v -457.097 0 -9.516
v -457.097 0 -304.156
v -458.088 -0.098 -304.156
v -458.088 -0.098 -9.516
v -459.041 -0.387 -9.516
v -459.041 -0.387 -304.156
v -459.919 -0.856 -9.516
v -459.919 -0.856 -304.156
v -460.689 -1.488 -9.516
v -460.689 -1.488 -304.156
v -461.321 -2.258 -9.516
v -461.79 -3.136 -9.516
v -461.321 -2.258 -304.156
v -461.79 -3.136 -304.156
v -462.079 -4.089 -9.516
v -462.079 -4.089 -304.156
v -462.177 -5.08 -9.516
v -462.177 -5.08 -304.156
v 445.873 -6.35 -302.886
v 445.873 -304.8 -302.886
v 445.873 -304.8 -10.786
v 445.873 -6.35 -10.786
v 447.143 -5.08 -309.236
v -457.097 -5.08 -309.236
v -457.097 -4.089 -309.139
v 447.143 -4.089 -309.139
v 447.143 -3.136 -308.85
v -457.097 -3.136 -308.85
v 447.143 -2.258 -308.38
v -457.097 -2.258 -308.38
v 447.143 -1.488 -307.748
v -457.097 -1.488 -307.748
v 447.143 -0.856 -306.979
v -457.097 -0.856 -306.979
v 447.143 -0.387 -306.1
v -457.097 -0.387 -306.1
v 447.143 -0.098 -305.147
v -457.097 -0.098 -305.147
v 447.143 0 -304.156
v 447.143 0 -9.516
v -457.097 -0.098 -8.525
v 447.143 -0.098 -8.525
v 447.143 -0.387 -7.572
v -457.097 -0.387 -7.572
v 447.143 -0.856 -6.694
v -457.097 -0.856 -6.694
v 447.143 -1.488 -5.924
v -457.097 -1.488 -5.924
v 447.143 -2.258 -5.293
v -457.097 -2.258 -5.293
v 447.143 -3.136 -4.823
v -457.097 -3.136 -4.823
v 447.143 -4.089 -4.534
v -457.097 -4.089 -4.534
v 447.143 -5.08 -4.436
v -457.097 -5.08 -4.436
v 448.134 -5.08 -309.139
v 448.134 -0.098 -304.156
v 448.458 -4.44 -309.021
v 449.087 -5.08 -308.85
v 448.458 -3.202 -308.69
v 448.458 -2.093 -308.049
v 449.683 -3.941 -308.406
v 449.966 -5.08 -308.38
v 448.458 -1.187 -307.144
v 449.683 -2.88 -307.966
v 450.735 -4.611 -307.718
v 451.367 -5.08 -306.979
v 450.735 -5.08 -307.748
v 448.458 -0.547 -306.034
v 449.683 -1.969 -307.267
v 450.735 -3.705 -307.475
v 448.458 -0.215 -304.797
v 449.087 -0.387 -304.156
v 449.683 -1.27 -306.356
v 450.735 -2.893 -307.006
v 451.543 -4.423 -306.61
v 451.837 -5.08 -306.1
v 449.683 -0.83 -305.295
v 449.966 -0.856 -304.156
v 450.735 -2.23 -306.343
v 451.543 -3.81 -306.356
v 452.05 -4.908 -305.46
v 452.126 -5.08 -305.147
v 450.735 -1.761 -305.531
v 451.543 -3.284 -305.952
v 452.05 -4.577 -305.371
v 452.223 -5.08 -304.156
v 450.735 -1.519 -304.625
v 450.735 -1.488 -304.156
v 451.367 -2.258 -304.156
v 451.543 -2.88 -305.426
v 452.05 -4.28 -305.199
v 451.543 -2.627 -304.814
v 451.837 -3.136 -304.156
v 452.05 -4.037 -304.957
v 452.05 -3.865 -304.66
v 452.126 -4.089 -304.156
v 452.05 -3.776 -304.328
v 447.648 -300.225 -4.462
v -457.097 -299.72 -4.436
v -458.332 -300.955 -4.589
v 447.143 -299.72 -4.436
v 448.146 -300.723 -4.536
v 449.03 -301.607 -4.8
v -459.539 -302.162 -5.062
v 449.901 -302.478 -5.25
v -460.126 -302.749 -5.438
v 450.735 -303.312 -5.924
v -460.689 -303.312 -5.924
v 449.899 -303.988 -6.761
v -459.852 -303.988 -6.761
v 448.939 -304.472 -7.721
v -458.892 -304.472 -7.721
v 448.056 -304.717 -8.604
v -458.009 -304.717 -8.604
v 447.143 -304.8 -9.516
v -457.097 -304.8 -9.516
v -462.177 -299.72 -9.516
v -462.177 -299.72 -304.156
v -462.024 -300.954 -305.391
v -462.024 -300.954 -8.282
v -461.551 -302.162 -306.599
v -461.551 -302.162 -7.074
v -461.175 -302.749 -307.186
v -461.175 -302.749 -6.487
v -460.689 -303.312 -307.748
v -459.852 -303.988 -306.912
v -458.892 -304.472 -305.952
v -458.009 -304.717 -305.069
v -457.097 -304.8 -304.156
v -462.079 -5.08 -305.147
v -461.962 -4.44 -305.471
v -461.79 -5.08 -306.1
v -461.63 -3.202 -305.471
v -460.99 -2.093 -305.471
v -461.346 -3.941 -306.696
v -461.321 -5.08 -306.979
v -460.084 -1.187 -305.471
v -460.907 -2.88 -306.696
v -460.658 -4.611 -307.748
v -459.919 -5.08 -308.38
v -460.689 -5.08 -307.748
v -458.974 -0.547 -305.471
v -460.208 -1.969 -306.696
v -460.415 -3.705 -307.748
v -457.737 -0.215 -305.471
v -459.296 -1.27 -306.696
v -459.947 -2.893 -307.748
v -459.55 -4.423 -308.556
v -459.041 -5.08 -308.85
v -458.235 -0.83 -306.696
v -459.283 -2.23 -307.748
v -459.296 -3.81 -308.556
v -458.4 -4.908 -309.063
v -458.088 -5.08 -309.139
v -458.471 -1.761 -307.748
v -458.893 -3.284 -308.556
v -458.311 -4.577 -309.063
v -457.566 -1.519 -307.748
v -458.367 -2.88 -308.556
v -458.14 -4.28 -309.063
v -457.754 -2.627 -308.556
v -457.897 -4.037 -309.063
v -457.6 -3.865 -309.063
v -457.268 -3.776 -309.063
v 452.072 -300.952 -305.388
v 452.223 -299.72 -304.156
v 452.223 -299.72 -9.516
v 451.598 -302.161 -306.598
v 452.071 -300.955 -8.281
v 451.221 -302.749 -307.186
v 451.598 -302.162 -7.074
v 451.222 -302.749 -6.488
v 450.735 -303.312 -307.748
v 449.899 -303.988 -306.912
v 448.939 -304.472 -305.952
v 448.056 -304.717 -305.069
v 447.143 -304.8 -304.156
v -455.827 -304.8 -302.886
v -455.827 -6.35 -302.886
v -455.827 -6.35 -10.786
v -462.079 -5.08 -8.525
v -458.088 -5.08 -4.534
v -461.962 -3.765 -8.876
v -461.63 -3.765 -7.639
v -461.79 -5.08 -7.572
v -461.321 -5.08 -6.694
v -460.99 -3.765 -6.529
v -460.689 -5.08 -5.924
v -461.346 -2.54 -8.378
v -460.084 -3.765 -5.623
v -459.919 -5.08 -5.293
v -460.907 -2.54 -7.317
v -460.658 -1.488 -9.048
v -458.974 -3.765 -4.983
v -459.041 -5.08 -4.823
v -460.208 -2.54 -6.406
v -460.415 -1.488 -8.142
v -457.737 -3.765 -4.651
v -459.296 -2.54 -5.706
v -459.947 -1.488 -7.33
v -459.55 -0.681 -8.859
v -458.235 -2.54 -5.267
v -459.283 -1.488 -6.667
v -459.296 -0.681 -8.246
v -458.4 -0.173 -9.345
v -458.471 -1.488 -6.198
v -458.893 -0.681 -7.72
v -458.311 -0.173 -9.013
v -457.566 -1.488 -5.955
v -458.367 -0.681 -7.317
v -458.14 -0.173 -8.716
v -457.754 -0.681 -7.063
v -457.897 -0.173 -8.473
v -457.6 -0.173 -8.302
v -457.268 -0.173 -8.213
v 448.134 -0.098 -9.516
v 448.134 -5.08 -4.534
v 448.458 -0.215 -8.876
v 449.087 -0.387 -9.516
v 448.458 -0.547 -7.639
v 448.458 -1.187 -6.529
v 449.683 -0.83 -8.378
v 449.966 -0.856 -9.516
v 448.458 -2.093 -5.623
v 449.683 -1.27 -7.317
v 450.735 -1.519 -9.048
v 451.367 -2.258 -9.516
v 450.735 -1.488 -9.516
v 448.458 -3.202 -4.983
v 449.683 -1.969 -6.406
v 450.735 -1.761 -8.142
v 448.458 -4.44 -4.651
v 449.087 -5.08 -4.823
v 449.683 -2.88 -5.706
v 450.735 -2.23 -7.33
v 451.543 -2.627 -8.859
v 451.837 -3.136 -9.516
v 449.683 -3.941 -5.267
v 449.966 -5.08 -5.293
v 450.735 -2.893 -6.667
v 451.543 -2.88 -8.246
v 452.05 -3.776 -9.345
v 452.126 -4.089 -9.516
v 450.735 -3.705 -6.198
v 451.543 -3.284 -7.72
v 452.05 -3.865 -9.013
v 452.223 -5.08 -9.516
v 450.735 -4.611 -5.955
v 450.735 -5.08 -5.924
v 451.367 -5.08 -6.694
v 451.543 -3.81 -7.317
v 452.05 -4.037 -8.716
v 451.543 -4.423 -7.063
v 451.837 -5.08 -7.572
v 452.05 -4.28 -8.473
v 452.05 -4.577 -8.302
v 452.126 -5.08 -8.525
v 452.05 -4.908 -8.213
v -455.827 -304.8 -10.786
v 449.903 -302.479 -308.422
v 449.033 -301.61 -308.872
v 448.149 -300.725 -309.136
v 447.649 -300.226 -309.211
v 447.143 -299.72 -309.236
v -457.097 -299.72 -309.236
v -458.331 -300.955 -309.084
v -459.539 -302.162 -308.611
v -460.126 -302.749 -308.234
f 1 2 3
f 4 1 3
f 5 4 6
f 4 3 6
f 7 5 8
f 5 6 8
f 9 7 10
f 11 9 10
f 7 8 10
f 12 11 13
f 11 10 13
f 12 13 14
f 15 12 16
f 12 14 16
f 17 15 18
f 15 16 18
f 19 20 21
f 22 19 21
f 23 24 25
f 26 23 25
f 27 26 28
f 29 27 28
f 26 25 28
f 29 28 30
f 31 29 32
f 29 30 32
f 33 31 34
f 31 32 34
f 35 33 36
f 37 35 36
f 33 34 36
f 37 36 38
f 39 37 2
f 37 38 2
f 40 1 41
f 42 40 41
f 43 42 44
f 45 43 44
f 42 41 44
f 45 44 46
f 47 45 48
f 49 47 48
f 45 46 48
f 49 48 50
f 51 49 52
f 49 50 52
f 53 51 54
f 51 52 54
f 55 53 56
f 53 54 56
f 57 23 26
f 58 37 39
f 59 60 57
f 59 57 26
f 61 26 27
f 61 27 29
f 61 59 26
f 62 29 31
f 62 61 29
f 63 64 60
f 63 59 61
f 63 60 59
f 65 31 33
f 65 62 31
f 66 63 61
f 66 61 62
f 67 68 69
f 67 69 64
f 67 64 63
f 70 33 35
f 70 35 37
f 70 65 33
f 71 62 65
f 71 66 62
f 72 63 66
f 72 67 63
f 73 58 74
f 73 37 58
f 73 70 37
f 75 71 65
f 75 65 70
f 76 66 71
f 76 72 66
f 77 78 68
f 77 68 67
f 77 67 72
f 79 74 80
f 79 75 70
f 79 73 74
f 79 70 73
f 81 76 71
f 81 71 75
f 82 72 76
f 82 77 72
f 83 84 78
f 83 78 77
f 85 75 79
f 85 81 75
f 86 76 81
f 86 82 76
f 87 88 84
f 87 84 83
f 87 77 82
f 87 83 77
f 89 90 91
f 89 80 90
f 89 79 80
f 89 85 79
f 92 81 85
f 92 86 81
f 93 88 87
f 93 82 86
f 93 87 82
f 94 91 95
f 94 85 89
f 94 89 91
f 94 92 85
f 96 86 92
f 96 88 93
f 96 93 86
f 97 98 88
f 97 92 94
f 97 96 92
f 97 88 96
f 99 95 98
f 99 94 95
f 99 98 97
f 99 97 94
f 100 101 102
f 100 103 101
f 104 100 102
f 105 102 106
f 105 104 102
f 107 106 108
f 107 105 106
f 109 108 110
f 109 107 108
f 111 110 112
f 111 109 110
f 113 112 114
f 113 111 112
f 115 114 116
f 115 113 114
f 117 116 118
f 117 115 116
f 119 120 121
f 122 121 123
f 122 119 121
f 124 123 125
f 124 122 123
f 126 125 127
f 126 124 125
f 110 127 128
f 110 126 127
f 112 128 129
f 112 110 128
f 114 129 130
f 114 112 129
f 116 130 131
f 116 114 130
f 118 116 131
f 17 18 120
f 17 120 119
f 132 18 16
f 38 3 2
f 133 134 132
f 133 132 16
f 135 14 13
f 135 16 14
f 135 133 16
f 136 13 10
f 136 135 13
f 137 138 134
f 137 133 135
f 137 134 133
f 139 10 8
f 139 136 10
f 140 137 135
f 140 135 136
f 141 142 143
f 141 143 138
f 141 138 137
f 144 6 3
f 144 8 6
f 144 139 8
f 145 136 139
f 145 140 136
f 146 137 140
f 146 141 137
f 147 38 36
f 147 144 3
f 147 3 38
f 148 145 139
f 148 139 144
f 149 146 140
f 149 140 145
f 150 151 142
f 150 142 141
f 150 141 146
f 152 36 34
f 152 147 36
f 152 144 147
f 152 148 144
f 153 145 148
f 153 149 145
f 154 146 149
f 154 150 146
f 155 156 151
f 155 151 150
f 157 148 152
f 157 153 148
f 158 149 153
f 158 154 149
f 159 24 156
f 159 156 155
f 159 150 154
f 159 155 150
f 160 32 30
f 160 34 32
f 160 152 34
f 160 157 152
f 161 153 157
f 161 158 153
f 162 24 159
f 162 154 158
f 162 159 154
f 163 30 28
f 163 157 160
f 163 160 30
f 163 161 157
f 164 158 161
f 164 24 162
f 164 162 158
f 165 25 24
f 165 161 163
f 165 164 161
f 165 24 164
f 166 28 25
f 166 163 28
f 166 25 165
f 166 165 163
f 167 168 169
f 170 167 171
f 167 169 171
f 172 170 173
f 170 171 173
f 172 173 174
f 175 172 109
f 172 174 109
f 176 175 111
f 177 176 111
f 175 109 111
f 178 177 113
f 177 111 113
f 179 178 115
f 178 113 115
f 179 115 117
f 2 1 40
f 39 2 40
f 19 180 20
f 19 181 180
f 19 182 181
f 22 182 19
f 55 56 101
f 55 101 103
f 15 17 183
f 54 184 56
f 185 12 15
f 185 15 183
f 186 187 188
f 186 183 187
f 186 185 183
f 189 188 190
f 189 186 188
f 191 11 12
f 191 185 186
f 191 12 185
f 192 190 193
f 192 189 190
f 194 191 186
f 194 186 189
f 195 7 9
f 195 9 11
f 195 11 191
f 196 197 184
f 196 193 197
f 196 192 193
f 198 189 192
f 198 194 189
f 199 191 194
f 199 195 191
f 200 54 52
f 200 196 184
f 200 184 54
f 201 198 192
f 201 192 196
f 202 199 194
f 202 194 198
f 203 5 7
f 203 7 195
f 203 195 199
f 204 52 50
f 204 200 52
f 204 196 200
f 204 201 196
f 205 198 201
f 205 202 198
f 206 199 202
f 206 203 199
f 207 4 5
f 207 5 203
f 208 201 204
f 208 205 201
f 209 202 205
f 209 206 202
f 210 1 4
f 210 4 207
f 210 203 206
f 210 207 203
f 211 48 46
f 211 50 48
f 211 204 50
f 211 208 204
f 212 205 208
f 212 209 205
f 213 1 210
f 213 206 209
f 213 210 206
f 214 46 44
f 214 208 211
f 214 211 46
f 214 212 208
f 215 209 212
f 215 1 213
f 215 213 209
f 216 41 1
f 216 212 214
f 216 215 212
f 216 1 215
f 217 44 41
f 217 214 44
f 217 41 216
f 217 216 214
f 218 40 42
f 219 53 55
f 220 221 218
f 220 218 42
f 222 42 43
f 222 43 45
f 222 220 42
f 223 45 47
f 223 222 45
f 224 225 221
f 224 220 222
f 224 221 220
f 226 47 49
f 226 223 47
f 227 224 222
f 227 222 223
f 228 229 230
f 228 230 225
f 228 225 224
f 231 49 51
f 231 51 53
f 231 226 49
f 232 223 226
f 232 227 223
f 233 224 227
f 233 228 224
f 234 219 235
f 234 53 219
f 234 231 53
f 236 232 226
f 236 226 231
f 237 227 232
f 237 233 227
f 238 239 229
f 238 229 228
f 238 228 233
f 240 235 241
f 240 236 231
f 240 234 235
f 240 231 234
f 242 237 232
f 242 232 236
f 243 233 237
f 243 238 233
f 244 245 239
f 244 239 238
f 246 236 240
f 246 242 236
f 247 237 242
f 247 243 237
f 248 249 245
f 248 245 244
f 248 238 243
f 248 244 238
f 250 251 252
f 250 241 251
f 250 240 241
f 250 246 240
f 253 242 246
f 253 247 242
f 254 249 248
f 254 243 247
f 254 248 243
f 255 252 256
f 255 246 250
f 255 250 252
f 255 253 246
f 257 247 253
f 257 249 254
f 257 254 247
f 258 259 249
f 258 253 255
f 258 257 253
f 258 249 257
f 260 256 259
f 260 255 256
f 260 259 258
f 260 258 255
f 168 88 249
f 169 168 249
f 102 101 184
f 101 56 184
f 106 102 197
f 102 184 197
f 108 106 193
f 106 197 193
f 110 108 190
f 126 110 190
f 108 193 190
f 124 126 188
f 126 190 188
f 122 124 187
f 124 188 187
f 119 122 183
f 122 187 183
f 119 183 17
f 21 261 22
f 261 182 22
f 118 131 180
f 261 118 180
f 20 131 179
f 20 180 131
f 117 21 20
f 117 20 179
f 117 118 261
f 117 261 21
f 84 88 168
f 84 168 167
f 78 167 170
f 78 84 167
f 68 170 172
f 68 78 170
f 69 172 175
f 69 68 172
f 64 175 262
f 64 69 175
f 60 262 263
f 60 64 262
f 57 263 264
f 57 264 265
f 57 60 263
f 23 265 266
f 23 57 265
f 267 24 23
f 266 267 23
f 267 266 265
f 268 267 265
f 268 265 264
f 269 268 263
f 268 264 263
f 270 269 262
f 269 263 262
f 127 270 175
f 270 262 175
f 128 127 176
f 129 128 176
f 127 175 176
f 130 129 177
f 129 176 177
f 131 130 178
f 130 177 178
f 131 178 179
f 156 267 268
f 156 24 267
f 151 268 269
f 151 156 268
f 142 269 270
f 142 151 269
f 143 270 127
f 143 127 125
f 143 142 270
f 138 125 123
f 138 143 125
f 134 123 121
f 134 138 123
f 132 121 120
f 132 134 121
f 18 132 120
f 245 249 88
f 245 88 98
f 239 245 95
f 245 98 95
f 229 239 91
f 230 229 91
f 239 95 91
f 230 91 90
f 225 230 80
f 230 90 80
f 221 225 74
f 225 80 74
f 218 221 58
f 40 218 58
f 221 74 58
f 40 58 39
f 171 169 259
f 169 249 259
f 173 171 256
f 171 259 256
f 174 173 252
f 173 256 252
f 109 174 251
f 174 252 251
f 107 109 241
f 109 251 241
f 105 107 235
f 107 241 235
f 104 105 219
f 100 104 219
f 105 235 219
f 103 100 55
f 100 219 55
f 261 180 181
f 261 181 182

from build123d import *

# Parameters (mm, degrees)
F0_W         = 914.4
F0_H         = 304.8
F1_DEPTH     = 304.8
F2_T         = -6.35
F3_R         = 5.08
F4_T1_DEPTH  = 307.34
F4_T3_DEPTH  = 904.24
F4_T5_DEPTH  = 294.64
F4_S9_W      = 5.1816
F4_S9_H      = 5.1816
F4_T10_DEPTH = 5.1816
F4_S15_W     = 5.1816
F4_S15_H     = 5.1816
F4_T16_DEPTH = 5.1816
F4_S21_W     = 5.1816
F4_S21_H     = 5.1816
F4_T22_DEPTH = 5.1816
F4_S27_W     = 5.1816
F4_S27_H     = 5.1816
F4_T28_DEPTH = 5.1816


# Not quite as in the source:
# - a fillet or chamfer that OpenCascade refuses, or shapes differently, is made with other operations: its cross-section is extruded or revolved along the edge and cut away or added


with BuildPart() as f1:
    # F0 (on Front) → F1 (new body)
    with BuildSketch(Plane.XZ):
        with Locations((-4.9767009914, -156.8363738472)):
            Rectangle(F0_W, F0_H)
    extrude(amount=F1_DEPTH)

    # F2
    f2_openings = [f1.faces().sort_by_distance(p)[0] for p in [
        (-4.976701, -304.8, -156.836374),
    ]]
    offset(amount=F2_T, openings=f2_openings)

    # F3
    f3_edges = [f1.edges().sort_by_distance(p)[0] for p in [
        (-4.976701, -304.8, -4.436374),
        (-462.176701, -304.8, -156.836374),
        (-4.976701, -304.8, -309.236374),
        (452.223299, -304.8, -156.836374),
    ]]
    fillet(f3_edges, radius=F3_R)

    # F4: fillet of radius 5.08 on 12 edges, made by hand

    # F4_s2 → F4_t1 (cut)
    with BuildSketch(Plane.XZ.offset(5.08)):
        with BuildLine():
            ThreePointArc((452.2232990086, -9.5163738472), (450.735401457, -5.9242713988), (447.1432990086, -4.4363738472))
            Line((447.1432990086, -4.4363738472), (452.2232990086, -4.4363738472))
            Line((452.2232990086, -4.4363738472), (452.2232990086, -9.5163738472))
        make_face()
        with BuildLine():
            ThreePointArc((-457.0967009914, -4.4363738472), (-460.6888034398, -5.9242713988), (-462.1767009914, -9.5163738472))
            Line((-462.1767009914, -9.5163738472), (-462.1767009914, -4.4363738472))
            Line((-462.1767009914, -4.4363738472), (-457.0967009914, -4.4363738472))
        make_face()
        with BuildLine():
            ThreePointArc((-457.0967009914, -309.2363738472), (-460.6888034398, -307.7484762956), (-462.1767009914, -304.1563738472))
            Line((-462.1767009914, -304.1563738472), (-462.1767009914, -309.2363738472))
            Line((-462.1767009914, -309.2363738472), (-457.0967009914, -309.2363738472))
        make_face()
        with BuildLine():
            ThreePointArc((452.2232990086, -304.1563738472), (450.735401457, -307.7484762956), (447.1432990086, -309.2363738472))
            Line((447.1432990086, -309.2363738472), (452.2232990086, -309.2363738472))
            Line((452.2232990086, -309.2363738472), (452.2232990086, -304.1563738472))
        make_face()
    extrude(amount=F4_T1_DEPTH, mode=Mode.SUBTRACT)

    # F4_s4 → F4_t3 (cut)
    with BuildSketch(Plane.YZ.offset(-457.0967009914)):
        with BuildLine():
            ThreePointArc((0, -9.5163738472), (-1.4878975516, -5.9242713988), (-5.08, -4.4363738472))
            Line((-5.08, -4.4363738472), (0, -4.4363738472))
            Line((0, -4.4363738472), (0, -9.5163738472))
        make_face()
        with BuildLine():
            ThreePointArc((-5.08, -309.2363738472), (-1.4878975516, -307.7484762956), (0, -304.1563738472))
            Line((0, -304.1563738472), (0, -309.2363738472))
            Line((0, -309.2363738472), (-5.08, -309.2363738472))
        make_face()
    extrude(amount=F4_T3_DEPTH, mode=Mode.SUBTRACT)

    # F4_s6 → F4_t5 (cut)
    with BuildSketch(Plane.XY.offset(-304.1563738472)):
        with BuildLine():
            ThreePointArc((-457.0967009914, 0), (-460.6888034398, -1.4878975516), (-462.1767009914, -5.08))
            Line((-462.1767009914, -5.08), (-462.1767009914, 0))
            Line((-462.1767009914, 0), (-457.0967009914, 0))
        make_face()
        with BuildLine():
            ThreePointArc((452.2232990086, -5.08), (450.735401457, -1.4878975516), (447.1432990086, 0))
            Line((447.1432990086, 0), (452.2232990086, 0))
            Line((452.2232990086, 0), (452.2232990086, -5.08))
        make_face()
    extrude(amount=F4_T5_DEPTH, mode=Mode.SUBTRACT)


with BuildPart() as f4_tool8:
    # F4_s9 → F4_t10 (new body)
    with BuildSketch(Plane.YZ.offset(447.1432990086)):
        with Locations((-2.4892, -6.9255738472)):
            Rectangle(F4_S9_W, F4_S9_H)
    extrude(amount=F4_T10_DEPTH)

    # F4_s11 → F4_t12 (revolve, cut)
    with BuildSketch(Plane(origin=(447.1432990086, -5.08, -9.5163738472), x_dir=(0, -0.7071067812, -0.7071067812), z_dir=(0, -0.7071067812, 0.7071067812))):
        with BuildLine():
            ThreePointArc((0, -5.08), (5.08, 0), (0, 5.08))
            Line((0, 5.08), (0, -5.08))
        make_face()
    revolve(axis=Axis((447.1432990086, -5.08, -9.5163738472), (1, 0, 0)), mode=Mode.SUBTRACT)


with BuildPart() as f1_1:
    add(f1.part)

    # F4_t7: cut F4_tool8
    add(f4_tool8.part, mode=Mode.SUBTRACT)


with BuildPart() as f4_tool14:
    # F4_s15 → F4_t16 (new body)
    with BuildSketch(Plane.XZ.offset(5.08)):
        with Locations((-459.6875009914, -6.9255738472)):
            Rectangle(F4_S15_W, F4_S15_H)
    extrude(amount=-F4_T16_DEPTH)

    # F4_s17 → F4_t18 (revolve, cut)
    with BuildSketch(Plane(origin=(-457.0967009914, -5.08, -9.5163738472), x_dir=(0.7071067812, 0, -0.7071067812), z_dir=(0.7071067812, 0, 0.7071067812))):
        with BuildLine():
            ThreePointArc((0, -5.08), (5.08, 0), (0, 5.08))
            Line((0, 5.08), (0, -5.08))
        make_face()
    revolve(axis=Axis((-457.0967009914, -5.08, -9.5163738472), (0, 1, 0)), mode=Mode.SUBTRACT)


with BuildPart() as f1_2:
    add(f1_1.part)

    # F4_t13: cut F4_tool14
    add(f4_tool14.part, mode=Mode.SUBTRACT)


with BuildPart() as f4_tool20:
    # F4_s21 → F4_t22 (new body)
    with BuildSketch(Plane.XY.offset(-304.1563738472)):
        with Locations((-459.6875009914, -2.4892)):
            Rectangle(F4_S21_W, F4_S21_H)
    extrude(amount=-F4_T22_DEPTH)

    # F4_s23 → F4_t24 (revolve, cut)
    with BuildSketch(Plane(origin=(-457.0967009914, -5.08, -304.1563738472), x_dir=(0.7071067812, -0.7071067812, 0), z_dir=(0.7071067812, 0.7071067812, 0))):
        with BuildLine():
            ThreePointArc((0, -5.08), (5.08, 0), (0, 5.08))
            Line((0, 5.08), (0, -5.08))
        make_face()
    revolve(axis=Axis((-457.0967009914, -5.08, -304.1563738472), (0, 0, -1)), mode=Mode.SUBTRACT)


with BuildPart() as f1_3:
    add(f1_2.part)

    # F4_t19: cut F4_tool20
    add(f4_tool20.part, mode=Mode.SUBTRACT)


with BuildPart() as f4_tool26:
    # F4_s27 → F4_t28 (new body)
    with BuildSketch(Plane.YZ.offset(447.1432990086)):
        with Locations((-2.4892, -306.7471738472)):
            Rectangle(F4_S27_W, F4_S27_H)
    extrude(amount=F4_T28_DEPTH)

    # F4_s29 → F4_t30 (revolve, cut)
    with BuildSketch(Plane(origin=(447.1432990086, -5.08, -304.1563738472), x_dir=(0, -0.7071067812, 0.7071067812), z_dir=(0, 0.7071067812, 0.7071067812))):
        with BuildLine():
            ThreePointArc((0, -5.08), (5.08, 0), (0, 5.08))
            Line((0, 5.08), (0, -5.08))
        make_face()
    revolve(axis=Axis((447.1432990086, -5.08, -304.1563738472), (1, 0, 0)), mode=Mode.SUBTRACT)


with BuildPart() as f1_4:
    add(f1_3.part)

    # F4_t25: cut F4_tool26
    add(f4_tool26.part, mode=Mode.SUBTRACT)


solid = f1_4.part
